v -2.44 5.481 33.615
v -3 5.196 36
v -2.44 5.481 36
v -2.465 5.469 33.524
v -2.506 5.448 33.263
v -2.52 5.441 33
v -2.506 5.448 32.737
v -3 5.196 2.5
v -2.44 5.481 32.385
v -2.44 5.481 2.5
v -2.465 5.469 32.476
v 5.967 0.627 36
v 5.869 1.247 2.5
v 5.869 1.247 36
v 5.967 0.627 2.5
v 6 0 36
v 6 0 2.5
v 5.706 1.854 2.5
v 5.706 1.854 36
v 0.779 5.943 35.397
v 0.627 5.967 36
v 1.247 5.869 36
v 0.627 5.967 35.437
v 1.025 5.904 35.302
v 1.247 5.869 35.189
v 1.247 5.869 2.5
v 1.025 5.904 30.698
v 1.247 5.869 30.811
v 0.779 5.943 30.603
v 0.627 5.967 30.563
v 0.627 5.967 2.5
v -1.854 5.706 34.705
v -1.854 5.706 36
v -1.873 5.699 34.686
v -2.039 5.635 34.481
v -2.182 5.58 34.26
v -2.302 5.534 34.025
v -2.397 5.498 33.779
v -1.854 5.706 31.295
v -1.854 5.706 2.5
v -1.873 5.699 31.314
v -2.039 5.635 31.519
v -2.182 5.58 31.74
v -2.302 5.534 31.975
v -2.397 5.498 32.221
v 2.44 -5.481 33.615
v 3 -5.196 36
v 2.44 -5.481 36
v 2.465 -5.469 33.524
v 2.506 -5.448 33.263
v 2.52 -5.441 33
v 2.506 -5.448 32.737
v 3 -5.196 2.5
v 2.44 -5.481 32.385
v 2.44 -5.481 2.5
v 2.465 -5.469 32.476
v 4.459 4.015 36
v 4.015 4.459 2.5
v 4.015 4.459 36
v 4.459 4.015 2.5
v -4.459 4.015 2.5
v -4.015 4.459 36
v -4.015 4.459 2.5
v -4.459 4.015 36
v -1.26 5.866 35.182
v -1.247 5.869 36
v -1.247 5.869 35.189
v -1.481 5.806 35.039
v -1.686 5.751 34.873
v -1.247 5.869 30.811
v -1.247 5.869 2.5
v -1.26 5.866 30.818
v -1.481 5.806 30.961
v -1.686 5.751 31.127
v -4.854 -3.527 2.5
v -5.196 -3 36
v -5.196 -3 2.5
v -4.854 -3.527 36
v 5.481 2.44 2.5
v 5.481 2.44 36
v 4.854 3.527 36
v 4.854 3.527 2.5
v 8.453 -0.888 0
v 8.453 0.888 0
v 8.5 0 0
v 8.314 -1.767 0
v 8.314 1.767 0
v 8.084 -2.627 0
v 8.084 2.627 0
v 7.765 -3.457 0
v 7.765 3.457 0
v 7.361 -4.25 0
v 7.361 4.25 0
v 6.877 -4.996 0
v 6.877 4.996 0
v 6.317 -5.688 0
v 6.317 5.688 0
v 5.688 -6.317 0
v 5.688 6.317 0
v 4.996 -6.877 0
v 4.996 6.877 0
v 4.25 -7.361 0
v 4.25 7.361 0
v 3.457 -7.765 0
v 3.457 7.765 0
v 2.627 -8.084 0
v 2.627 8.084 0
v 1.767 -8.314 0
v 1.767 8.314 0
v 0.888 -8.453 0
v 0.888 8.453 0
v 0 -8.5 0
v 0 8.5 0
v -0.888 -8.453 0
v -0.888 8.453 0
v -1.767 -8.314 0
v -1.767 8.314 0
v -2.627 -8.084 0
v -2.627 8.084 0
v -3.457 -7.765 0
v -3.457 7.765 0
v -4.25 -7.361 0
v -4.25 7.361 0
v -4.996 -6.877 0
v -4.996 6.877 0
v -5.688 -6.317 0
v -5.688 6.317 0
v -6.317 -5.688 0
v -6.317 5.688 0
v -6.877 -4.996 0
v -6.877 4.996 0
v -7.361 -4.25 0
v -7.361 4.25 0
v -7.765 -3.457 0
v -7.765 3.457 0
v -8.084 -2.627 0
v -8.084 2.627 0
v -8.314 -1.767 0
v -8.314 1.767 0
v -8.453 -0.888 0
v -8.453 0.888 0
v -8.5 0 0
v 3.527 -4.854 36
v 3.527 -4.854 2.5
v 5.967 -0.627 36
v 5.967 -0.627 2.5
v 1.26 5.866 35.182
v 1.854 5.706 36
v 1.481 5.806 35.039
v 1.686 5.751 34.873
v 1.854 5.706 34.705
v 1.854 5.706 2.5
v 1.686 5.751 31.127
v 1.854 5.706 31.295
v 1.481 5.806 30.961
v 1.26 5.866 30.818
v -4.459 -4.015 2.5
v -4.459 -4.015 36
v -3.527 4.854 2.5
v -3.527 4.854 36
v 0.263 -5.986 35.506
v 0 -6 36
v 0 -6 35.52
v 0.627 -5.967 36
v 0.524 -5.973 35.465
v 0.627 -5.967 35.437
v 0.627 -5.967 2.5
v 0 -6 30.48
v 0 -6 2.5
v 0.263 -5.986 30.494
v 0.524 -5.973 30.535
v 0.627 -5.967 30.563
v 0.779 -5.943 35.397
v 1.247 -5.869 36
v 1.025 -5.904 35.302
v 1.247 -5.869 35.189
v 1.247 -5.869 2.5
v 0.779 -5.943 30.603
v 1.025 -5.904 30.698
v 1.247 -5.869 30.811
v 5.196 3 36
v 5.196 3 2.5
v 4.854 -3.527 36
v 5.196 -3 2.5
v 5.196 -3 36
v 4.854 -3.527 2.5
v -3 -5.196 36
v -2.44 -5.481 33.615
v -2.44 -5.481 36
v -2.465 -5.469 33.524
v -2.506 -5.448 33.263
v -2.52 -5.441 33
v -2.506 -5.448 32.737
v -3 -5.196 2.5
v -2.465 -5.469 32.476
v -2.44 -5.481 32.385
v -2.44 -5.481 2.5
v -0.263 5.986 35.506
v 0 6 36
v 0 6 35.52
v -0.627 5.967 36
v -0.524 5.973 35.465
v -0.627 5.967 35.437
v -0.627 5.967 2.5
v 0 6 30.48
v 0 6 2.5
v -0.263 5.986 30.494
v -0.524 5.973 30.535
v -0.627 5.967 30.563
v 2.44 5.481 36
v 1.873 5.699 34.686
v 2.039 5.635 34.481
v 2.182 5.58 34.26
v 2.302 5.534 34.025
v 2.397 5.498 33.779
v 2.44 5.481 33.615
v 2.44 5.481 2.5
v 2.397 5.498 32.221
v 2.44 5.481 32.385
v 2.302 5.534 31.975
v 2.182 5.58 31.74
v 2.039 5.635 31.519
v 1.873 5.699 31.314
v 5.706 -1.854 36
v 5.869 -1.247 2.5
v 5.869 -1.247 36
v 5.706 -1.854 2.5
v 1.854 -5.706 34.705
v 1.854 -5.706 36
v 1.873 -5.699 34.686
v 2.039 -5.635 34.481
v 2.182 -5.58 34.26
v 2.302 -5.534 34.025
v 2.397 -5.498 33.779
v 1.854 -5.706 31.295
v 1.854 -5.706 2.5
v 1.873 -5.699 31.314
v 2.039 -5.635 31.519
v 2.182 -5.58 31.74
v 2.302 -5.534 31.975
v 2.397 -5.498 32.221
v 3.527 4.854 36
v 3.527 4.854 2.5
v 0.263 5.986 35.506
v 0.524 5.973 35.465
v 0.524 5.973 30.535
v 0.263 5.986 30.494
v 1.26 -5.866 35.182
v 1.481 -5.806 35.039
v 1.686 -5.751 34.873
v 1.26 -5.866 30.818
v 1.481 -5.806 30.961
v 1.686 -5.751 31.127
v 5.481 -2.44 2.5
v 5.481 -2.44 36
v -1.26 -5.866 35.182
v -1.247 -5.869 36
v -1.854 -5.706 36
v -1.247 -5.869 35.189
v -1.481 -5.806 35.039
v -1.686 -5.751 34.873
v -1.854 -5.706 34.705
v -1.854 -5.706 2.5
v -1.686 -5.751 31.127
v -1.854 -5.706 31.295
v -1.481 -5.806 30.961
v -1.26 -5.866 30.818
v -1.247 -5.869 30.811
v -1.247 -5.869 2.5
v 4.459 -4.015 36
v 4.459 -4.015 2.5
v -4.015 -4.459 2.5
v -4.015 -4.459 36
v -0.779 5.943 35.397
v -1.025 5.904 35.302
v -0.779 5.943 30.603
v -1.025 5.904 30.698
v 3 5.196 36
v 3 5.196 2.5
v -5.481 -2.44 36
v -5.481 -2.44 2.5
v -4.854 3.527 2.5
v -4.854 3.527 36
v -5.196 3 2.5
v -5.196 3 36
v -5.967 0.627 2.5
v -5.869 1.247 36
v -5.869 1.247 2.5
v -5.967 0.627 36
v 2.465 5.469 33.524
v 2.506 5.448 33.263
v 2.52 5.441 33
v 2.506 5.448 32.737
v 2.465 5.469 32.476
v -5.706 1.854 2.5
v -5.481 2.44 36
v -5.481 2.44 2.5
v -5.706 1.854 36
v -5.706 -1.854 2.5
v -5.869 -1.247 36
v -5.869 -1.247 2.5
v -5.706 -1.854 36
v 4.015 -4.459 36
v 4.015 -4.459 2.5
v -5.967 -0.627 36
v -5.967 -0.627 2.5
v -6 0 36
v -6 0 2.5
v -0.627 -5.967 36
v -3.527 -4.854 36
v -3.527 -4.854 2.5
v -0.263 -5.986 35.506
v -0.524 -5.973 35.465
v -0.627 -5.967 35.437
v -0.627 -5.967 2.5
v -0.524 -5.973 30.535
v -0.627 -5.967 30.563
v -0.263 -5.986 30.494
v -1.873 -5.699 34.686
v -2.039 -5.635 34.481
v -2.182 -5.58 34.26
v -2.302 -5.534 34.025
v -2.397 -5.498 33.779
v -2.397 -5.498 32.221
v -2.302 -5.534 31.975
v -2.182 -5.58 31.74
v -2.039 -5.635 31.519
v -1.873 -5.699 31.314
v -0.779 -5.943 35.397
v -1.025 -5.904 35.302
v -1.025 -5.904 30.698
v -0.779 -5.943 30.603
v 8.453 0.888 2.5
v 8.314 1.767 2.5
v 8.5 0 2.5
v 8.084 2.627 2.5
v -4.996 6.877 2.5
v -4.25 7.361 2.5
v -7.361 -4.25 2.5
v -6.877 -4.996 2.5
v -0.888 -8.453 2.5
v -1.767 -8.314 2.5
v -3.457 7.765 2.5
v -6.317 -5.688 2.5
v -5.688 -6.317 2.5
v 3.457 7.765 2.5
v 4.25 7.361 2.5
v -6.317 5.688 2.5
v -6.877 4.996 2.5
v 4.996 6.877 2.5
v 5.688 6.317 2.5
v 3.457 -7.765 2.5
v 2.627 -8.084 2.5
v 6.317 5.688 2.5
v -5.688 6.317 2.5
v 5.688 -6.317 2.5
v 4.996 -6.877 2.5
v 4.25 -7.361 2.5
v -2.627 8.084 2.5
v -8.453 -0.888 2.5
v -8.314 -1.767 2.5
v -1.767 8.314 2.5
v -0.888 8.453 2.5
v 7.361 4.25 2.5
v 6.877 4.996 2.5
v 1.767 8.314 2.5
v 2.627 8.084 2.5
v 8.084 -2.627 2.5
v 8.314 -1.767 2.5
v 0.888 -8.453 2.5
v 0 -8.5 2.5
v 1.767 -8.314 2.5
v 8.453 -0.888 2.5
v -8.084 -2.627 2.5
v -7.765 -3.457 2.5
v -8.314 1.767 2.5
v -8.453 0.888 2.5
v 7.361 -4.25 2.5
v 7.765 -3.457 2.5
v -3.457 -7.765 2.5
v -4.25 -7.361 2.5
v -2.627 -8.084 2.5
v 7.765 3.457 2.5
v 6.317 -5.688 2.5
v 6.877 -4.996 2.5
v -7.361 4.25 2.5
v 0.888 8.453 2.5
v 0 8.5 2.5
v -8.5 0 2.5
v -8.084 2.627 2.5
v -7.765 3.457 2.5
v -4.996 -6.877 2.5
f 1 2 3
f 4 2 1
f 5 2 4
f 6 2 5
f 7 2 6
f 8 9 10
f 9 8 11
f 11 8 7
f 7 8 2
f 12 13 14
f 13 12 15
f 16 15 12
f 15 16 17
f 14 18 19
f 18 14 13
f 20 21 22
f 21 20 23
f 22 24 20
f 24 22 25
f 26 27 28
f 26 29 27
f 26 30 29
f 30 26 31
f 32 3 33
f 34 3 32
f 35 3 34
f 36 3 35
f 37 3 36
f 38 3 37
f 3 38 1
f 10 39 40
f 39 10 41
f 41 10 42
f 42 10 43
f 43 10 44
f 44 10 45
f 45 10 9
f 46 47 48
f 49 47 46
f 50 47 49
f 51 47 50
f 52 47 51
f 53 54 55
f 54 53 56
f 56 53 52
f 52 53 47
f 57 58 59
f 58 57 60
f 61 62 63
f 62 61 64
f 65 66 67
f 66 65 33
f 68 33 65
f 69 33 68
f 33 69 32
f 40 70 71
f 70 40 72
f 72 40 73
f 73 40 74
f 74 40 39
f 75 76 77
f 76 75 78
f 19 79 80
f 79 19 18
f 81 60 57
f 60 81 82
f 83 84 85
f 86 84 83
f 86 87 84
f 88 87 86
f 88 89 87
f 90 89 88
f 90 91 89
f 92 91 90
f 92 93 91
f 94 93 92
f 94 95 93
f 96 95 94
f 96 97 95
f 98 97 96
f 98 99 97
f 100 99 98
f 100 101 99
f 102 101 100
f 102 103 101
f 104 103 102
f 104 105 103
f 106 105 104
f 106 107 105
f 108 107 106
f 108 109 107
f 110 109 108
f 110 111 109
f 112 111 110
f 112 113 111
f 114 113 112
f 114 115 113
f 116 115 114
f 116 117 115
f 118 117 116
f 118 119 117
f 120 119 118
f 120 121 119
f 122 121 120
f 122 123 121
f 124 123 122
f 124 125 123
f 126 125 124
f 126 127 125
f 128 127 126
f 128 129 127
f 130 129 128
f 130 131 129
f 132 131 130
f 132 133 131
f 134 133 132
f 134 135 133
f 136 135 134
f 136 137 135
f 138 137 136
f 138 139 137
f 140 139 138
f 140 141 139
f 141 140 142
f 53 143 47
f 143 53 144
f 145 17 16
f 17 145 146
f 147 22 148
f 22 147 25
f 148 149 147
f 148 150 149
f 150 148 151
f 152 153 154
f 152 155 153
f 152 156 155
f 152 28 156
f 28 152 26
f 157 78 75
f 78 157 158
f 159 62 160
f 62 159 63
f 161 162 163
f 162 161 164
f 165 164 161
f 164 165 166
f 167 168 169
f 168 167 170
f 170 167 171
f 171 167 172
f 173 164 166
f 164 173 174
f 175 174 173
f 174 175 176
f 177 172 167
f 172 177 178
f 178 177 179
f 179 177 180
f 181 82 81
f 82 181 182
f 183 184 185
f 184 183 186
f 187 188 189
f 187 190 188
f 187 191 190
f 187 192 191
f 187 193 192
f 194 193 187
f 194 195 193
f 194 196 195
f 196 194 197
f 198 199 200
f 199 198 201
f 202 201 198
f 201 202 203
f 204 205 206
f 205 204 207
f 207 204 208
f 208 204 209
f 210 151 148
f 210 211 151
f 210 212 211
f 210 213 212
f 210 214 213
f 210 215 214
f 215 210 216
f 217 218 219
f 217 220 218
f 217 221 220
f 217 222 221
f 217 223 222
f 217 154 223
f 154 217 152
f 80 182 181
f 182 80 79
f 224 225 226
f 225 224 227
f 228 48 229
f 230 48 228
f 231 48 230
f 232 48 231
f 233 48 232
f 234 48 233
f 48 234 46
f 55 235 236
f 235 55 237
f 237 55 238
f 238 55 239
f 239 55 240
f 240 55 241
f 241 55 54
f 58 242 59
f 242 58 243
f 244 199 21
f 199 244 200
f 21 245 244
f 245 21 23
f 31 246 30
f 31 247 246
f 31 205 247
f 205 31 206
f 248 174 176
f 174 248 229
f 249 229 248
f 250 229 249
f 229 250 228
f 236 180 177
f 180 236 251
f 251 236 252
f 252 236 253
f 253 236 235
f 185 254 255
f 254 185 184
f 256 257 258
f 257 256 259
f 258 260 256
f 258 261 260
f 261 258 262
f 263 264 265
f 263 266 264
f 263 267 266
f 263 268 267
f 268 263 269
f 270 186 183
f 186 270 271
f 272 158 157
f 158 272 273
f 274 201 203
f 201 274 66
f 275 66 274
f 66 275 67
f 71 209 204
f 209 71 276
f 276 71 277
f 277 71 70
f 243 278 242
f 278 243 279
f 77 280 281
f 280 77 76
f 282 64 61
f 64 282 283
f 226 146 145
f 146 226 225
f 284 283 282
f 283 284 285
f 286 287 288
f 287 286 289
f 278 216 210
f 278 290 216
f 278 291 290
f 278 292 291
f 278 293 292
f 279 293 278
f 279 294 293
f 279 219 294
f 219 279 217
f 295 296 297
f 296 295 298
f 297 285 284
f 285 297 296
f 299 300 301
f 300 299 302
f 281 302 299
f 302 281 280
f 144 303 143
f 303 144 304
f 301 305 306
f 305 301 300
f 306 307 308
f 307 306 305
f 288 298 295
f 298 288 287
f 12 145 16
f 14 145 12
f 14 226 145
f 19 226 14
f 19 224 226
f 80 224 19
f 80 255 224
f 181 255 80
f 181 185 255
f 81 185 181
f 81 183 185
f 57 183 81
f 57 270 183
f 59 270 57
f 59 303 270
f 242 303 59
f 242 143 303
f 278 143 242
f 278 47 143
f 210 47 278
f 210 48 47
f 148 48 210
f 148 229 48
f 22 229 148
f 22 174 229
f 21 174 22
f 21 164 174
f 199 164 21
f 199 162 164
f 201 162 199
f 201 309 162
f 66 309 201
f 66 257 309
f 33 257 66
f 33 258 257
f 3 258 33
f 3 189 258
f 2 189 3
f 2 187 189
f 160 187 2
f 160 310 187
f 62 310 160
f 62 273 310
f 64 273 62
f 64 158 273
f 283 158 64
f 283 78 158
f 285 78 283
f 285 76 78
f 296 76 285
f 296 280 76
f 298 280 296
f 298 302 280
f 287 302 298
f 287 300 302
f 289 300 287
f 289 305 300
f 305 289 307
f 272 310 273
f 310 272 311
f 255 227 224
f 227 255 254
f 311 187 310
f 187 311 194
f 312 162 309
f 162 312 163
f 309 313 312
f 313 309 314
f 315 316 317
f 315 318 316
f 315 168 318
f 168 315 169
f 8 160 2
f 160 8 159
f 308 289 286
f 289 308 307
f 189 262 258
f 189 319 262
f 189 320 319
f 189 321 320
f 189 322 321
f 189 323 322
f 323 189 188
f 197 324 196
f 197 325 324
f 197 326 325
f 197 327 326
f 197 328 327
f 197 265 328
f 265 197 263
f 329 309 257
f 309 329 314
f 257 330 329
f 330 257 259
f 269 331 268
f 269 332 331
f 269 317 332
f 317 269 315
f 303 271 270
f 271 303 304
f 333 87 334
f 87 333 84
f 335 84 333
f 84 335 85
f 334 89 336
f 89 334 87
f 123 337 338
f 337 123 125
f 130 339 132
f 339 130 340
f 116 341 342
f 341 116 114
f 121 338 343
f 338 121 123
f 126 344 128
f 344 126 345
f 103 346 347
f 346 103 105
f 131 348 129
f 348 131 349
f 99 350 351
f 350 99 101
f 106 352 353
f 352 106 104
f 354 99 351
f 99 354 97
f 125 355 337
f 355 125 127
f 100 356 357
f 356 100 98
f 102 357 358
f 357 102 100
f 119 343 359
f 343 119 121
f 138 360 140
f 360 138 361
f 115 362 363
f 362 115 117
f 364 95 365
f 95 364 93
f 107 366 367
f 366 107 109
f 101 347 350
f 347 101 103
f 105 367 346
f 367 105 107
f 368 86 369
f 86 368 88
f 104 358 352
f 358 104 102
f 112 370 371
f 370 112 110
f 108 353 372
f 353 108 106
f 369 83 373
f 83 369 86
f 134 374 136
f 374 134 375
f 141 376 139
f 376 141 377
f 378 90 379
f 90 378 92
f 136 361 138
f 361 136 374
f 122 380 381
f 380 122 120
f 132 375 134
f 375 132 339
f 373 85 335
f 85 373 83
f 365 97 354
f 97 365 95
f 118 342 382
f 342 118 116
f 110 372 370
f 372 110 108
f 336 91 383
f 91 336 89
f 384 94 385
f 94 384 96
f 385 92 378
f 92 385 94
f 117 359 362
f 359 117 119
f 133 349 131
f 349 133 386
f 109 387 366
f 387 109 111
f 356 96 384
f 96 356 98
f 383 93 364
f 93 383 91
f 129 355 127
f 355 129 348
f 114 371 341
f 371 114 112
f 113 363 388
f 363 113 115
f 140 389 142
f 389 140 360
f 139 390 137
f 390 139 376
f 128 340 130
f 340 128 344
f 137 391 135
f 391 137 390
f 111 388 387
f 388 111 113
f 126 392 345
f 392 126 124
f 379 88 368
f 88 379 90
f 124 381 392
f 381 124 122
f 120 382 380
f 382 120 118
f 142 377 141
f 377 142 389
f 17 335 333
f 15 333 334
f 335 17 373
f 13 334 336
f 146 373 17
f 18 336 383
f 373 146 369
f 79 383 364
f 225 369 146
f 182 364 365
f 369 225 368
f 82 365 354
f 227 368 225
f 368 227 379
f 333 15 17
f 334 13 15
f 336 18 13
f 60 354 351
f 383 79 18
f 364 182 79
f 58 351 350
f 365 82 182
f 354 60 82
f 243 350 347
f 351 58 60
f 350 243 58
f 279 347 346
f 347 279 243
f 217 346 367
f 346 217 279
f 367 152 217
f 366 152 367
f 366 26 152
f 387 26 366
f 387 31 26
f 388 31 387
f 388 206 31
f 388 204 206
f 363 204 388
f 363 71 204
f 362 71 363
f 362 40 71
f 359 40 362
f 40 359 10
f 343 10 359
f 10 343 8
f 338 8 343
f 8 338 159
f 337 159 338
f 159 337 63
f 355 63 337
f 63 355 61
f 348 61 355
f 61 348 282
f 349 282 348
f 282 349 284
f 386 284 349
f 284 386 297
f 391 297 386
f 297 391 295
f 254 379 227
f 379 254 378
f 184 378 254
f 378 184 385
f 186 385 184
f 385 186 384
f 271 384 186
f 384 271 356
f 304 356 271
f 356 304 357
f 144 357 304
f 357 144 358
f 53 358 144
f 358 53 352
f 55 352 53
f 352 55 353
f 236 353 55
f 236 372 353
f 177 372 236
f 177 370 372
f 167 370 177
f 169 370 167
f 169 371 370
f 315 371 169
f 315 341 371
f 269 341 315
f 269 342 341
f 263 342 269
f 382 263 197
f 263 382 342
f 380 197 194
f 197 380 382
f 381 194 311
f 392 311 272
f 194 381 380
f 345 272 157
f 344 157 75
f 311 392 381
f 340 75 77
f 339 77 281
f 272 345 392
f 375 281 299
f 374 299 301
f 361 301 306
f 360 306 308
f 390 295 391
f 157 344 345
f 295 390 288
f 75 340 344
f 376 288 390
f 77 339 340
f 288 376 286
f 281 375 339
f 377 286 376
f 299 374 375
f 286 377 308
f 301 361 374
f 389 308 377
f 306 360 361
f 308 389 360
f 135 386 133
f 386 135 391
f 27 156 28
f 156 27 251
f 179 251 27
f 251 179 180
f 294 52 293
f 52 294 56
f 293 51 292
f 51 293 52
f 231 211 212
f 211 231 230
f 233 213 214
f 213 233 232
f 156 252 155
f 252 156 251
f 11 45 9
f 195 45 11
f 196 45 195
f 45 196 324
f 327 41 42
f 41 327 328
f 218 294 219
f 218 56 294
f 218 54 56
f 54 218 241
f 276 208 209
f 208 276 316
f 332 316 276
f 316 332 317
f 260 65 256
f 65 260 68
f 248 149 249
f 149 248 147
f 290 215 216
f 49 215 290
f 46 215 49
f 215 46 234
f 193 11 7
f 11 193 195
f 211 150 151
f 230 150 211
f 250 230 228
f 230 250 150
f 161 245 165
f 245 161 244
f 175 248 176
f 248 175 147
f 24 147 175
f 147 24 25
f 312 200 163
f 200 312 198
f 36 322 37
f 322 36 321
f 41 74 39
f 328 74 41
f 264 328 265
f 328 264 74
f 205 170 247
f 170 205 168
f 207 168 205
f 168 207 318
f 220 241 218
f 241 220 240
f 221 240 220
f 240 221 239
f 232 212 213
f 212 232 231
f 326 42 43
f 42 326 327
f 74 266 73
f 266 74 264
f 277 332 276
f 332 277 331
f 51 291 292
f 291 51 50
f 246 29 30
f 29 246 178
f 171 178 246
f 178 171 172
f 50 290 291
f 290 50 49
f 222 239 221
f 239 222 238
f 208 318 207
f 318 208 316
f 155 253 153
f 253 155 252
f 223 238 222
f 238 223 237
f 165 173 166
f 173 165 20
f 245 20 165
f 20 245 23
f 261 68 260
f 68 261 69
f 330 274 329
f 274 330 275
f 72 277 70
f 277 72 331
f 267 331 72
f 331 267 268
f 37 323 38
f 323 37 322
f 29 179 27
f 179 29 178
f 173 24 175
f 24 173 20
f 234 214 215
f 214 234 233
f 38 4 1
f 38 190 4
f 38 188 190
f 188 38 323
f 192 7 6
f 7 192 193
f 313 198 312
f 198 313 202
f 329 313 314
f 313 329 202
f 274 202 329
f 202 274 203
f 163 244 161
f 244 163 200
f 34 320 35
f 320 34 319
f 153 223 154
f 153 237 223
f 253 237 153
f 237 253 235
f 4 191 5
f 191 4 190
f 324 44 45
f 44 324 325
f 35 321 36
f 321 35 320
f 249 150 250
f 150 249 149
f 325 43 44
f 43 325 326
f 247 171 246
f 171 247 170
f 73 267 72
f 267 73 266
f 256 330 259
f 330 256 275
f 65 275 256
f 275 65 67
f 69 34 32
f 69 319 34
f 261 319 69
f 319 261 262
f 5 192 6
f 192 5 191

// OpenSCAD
// Clevis pin with cross-hole.
$fn = 60;
eps = 0.02;
pin_d = 12;
pin_l = 36;
head_d = pin_d + 5;
difference() {
    union() { cylinder(d=pin_d,h=pin_l); cylinder(d=head_d,h=2.5); }
    translate([0,-pin_d-eps,pin_l-3]) rotate([-90,0,0]) cylinder(d=pin_d*0.42,h=2*pin_d+2*eps);
}
